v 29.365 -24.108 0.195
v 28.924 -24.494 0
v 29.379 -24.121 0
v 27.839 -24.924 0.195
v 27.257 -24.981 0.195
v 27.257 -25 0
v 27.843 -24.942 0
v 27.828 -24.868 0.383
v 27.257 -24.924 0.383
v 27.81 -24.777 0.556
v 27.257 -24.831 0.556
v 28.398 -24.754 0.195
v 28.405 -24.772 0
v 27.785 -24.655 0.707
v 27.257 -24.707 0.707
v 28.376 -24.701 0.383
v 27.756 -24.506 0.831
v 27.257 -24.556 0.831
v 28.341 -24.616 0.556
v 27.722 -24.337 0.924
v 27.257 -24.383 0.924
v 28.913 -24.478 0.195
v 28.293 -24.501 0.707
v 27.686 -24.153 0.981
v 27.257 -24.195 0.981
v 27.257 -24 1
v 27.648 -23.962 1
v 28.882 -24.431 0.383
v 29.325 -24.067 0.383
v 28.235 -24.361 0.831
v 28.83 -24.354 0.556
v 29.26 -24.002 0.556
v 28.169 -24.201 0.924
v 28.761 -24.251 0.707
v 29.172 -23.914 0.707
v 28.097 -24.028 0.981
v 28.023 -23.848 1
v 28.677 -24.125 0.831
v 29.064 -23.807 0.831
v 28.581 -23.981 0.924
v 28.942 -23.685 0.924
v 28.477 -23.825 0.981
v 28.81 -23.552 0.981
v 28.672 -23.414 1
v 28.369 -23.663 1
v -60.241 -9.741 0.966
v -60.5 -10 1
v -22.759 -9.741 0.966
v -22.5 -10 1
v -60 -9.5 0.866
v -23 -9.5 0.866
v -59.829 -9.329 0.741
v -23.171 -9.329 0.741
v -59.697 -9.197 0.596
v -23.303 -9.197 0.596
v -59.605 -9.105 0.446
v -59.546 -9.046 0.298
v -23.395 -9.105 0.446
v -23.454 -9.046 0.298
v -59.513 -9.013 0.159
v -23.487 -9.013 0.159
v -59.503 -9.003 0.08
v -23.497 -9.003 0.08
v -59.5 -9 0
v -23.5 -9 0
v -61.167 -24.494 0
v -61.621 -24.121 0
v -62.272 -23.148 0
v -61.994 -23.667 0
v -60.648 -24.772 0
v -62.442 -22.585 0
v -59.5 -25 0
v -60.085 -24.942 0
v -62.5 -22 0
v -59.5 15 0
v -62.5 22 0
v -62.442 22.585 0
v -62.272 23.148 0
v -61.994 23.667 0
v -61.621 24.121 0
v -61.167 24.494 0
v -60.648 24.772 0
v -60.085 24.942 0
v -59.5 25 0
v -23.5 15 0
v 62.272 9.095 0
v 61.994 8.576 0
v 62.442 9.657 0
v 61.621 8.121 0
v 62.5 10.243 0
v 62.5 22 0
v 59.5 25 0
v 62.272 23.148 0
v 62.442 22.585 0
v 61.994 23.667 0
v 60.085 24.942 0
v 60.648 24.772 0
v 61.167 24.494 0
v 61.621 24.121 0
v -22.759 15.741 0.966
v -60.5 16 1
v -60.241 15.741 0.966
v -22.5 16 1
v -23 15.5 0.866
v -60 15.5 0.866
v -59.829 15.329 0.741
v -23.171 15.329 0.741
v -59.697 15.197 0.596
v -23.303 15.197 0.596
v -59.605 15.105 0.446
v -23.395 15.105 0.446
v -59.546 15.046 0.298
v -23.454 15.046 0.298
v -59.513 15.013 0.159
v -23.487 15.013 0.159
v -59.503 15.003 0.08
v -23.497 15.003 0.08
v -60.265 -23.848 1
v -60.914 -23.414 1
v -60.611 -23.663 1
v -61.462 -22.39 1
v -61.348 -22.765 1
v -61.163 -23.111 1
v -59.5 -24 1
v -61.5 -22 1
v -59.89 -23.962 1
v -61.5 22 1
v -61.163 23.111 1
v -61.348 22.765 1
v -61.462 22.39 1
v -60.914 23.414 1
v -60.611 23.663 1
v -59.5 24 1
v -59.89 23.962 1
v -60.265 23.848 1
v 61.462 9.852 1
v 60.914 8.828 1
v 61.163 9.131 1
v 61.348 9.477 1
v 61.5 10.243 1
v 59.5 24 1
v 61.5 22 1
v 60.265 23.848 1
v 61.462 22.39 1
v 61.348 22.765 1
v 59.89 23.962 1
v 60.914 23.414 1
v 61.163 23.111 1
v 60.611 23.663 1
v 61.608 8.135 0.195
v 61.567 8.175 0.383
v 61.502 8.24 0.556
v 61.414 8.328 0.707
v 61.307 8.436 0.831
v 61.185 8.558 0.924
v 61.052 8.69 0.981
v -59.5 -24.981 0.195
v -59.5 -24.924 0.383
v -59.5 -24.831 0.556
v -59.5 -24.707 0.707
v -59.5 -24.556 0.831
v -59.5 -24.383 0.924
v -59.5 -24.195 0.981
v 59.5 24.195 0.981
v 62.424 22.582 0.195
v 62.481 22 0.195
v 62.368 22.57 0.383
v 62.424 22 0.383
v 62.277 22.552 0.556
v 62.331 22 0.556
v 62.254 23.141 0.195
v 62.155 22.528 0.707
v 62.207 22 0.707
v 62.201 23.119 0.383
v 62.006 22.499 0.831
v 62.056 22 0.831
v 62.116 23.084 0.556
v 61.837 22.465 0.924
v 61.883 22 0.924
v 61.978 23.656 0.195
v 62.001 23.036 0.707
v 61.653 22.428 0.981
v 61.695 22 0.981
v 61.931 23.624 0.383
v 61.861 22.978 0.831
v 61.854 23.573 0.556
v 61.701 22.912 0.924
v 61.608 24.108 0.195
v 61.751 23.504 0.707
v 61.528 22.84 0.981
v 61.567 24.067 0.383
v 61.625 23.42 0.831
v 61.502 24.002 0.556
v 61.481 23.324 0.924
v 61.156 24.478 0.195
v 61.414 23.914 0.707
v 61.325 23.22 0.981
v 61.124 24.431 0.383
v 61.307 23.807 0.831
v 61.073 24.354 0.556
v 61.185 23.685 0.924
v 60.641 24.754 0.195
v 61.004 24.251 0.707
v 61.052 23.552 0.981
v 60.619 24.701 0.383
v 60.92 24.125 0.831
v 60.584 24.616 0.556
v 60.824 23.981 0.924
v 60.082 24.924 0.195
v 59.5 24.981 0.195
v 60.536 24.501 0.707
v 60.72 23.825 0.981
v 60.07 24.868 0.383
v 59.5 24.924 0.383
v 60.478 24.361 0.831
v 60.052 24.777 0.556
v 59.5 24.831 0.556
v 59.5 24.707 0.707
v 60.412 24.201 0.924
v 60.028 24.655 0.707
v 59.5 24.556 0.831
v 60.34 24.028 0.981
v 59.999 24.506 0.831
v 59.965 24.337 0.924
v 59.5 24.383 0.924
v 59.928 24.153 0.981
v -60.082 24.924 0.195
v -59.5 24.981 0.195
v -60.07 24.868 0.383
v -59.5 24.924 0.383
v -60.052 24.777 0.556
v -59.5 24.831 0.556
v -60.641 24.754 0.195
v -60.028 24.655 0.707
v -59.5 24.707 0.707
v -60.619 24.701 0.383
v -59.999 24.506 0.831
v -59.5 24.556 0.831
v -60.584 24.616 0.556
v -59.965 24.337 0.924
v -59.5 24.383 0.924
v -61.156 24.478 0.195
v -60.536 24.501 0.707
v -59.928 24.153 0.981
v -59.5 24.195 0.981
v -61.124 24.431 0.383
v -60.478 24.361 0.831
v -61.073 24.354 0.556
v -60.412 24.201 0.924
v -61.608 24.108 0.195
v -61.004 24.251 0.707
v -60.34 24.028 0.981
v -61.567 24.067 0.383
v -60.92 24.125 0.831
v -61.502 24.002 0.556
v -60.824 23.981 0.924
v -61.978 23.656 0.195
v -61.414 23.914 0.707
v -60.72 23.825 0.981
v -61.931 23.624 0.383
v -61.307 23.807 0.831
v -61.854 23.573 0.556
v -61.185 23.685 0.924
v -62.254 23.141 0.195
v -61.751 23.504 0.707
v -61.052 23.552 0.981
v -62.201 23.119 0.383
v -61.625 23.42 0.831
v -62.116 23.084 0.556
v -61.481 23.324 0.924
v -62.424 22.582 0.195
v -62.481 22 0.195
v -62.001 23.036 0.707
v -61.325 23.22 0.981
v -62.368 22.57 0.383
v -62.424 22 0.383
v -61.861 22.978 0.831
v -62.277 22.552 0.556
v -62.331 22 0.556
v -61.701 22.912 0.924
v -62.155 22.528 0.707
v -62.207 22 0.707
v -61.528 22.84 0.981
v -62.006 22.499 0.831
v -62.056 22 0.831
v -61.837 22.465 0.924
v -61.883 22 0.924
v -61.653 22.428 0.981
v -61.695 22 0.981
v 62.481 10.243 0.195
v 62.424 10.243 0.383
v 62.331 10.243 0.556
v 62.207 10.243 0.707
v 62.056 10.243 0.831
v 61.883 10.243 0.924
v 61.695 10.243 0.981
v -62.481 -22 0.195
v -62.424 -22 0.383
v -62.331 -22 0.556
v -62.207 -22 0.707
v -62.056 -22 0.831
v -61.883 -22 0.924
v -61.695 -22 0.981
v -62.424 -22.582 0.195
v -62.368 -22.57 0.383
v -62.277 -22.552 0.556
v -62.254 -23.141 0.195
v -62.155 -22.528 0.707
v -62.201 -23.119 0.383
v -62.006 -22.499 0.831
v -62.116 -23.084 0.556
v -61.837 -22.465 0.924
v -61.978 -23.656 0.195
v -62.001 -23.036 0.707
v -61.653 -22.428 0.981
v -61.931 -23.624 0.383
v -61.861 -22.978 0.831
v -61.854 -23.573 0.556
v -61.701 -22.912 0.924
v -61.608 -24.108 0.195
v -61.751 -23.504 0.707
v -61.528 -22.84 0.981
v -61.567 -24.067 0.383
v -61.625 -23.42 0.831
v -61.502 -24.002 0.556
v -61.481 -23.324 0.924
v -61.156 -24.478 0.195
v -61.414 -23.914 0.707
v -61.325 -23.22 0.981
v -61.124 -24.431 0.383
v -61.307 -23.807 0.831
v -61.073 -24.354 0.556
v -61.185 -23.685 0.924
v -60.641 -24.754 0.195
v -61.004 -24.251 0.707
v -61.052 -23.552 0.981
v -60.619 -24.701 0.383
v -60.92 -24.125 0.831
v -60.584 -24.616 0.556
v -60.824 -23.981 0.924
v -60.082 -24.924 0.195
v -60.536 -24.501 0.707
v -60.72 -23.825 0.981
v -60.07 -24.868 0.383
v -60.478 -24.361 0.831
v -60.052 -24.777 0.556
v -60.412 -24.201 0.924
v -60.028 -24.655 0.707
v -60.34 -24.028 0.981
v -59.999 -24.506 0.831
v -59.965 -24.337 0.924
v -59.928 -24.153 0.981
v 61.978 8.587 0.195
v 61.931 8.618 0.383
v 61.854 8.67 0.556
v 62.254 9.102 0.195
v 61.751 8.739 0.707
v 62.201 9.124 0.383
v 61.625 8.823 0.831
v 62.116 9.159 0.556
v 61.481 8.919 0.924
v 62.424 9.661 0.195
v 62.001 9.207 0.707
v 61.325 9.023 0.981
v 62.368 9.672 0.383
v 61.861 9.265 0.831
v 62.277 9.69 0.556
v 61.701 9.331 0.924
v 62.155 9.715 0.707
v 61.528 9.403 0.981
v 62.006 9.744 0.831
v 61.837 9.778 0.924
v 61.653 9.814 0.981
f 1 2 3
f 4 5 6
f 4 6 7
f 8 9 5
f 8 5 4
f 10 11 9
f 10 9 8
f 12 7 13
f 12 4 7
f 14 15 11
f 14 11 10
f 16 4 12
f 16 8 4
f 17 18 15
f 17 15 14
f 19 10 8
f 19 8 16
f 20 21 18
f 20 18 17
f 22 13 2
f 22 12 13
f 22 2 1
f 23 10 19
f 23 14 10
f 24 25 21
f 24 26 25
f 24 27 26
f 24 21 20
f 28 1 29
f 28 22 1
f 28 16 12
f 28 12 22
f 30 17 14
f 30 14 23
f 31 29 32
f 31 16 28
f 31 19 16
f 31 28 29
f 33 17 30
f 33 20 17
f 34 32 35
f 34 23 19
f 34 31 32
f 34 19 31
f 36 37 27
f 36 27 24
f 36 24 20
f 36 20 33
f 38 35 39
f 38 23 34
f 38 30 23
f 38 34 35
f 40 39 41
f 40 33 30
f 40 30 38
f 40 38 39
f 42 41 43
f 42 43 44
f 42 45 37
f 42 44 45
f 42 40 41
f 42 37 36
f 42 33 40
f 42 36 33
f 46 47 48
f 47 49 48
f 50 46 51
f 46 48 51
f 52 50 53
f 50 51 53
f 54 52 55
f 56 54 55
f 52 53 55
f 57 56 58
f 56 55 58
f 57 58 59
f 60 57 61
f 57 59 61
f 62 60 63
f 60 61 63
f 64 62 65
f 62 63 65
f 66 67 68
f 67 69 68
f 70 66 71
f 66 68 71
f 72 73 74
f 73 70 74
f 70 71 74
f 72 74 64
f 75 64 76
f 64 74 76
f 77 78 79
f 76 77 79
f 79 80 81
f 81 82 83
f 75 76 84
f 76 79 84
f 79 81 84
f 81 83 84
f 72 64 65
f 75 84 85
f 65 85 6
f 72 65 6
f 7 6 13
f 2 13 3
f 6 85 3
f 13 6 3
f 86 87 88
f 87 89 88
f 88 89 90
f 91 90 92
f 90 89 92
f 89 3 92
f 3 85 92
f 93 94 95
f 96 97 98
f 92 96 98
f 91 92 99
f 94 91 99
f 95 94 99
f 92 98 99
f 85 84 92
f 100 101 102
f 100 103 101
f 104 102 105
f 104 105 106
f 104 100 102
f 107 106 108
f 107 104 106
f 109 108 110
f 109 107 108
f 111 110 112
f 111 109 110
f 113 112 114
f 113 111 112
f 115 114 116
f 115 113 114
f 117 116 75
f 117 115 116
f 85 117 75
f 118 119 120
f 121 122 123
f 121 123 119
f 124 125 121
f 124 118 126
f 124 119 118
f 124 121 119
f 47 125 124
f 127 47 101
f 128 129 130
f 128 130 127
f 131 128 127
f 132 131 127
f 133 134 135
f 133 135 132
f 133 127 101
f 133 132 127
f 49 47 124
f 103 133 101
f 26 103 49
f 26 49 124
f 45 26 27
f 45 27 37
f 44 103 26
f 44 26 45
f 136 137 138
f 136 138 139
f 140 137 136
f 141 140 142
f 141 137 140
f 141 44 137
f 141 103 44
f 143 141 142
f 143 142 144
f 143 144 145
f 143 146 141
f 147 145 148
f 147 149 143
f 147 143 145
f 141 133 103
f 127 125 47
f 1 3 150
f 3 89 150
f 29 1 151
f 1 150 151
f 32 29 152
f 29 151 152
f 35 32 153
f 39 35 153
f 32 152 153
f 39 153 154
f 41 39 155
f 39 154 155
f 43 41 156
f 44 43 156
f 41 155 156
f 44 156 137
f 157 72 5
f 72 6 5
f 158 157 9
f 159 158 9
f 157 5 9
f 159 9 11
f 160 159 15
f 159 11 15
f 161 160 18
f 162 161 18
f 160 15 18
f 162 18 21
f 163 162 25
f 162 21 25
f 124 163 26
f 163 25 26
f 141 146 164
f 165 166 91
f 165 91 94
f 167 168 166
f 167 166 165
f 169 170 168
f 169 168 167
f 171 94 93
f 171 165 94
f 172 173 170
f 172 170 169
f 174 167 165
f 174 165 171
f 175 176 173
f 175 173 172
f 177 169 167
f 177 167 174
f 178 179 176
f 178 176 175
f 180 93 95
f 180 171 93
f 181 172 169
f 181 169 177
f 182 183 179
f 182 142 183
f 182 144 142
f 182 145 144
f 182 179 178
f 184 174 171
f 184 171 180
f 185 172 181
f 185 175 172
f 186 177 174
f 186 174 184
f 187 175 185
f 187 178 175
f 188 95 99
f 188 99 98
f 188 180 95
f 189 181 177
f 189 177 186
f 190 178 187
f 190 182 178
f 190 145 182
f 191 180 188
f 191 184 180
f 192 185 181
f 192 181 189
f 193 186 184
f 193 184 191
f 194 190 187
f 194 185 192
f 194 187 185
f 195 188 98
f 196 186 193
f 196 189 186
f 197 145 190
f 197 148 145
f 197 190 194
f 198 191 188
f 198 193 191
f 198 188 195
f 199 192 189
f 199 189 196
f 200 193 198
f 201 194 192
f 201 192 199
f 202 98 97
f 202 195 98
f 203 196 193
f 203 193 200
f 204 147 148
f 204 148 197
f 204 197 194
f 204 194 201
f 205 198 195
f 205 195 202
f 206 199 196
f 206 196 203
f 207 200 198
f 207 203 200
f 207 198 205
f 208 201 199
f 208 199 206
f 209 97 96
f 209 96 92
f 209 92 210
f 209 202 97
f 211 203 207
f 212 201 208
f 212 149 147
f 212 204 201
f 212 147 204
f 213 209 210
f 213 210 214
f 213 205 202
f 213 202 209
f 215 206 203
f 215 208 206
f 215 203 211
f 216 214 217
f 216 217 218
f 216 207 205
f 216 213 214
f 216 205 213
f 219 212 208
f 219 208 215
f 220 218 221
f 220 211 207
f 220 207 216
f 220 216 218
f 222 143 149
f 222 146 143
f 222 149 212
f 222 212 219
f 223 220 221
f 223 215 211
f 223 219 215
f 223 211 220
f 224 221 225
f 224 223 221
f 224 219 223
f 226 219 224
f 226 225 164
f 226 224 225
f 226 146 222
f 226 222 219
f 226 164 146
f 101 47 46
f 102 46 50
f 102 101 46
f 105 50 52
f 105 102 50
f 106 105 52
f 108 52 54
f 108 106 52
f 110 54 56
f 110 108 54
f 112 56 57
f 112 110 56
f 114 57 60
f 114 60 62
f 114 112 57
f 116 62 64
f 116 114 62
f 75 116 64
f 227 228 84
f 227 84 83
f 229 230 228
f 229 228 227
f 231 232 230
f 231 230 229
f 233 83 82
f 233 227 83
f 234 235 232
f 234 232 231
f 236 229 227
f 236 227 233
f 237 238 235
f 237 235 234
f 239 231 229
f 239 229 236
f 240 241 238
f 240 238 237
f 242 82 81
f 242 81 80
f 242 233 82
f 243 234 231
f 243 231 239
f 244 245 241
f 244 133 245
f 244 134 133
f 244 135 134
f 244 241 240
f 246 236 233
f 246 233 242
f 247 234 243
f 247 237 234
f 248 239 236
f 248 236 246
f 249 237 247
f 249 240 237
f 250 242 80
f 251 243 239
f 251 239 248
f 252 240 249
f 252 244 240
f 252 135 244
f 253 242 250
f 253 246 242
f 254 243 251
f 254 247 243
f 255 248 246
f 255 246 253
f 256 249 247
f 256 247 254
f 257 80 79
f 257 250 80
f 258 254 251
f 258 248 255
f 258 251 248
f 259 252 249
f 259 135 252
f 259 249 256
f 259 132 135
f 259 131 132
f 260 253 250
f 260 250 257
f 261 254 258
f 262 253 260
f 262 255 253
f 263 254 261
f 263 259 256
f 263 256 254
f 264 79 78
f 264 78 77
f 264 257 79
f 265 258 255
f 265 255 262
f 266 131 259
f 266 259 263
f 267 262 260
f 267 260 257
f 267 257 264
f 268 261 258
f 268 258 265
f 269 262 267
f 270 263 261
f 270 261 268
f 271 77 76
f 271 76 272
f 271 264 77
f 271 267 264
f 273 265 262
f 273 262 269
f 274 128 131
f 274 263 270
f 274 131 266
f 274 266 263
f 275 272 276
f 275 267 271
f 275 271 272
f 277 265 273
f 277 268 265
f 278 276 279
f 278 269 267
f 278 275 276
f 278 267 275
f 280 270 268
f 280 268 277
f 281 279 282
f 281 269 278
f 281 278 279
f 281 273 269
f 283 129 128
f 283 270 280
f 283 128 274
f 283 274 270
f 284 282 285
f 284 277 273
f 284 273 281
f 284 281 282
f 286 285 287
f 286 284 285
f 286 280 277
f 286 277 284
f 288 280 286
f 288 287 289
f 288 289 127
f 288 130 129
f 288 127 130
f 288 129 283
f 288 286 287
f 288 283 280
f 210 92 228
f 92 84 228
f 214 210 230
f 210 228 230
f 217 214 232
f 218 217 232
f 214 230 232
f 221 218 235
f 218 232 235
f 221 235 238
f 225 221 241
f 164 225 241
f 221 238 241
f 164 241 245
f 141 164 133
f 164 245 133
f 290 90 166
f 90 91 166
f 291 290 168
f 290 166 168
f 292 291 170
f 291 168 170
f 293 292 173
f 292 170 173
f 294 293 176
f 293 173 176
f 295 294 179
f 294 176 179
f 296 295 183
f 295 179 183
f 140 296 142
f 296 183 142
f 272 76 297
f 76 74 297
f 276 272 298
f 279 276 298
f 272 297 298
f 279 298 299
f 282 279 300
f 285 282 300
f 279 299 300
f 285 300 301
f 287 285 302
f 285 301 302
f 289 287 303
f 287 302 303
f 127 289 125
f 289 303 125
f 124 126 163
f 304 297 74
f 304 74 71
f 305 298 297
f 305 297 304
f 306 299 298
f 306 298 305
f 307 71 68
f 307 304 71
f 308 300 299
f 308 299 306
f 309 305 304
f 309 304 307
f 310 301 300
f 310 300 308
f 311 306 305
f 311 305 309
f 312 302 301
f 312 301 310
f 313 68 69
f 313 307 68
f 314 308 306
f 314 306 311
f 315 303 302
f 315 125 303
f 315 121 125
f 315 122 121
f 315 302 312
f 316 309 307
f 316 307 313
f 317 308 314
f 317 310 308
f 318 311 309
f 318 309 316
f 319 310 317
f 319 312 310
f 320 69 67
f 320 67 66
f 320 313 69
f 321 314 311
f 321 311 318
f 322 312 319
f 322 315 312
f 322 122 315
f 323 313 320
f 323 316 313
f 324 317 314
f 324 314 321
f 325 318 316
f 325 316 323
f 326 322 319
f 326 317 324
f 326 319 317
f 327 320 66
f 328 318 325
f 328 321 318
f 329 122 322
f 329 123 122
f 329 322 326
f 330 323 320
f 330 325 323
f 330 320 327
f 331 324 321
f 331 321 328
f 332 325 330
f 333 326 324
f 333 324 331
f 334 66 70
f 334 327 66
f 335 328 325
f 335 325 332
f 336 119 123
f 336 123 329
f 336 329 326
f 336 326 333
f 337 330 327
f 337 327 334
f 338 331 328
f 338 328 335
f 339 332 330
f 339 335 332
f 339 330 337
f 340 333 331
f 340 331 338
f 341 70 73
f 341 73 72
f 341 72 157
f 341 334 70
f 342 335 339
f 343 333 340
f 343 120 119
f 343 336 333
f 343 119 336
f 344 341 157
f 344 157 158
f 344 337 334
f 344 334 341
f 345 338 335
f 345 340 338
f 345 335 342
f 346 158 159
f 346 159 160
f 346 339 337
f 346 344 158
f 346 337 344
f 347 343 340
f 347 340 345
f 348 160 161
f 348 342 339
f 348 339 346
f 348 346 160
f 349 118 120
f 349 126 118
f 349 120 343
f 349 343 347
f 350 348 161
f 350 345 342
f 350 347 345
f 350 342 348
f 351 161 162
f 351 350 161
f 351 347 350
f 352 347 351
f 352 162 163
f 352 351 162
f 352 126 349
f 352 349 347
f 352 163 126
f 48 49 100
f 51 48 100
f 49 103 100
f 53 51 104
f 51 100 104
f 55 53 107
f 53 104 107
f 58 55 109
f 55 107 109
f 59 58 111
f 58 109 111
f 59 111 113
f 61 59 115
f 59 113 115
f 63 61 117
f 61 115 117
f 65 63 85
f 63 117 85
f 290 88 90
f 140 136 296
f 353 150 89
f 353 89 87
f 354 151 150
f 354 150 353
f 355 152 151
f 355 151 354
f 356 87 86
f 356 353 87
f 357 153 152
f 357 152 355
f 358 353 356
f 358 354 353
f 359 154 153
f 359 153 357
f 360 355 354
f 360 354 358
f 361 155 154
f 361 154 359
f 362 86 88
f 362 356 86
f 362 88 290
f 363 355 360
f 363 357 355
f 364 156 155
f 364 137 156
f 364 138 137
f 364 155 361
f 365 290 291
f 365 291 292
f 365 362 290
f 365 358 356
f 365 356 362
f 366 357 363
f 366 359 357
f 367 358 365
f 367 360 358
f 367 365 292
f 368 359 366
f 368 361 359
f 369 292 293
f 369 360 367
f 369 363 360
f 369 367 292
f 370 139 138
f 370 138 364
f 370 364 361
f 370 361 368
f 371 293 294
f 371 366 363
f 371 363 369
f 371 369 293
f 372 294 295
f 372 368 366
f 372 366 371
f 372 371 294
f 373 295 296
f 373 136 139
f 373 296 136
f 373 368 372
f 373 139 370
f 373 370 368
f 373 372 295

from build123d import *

# Parameters (mm, degrees)
F1_DEPTH = 1
F2_W     = 36
F2_H     = 24
F3_DEPTH = 25
F4_R     = 3
F5_R     = 0.99999


# Not quite as in the source:
# - a fillet or chamfer is up to 0.001 mm smaller than in the source, because OpenCascade refuses the exact size


with BuildPart() as f1:
    # F0 (on Top) → F1 (new body)
    with BuildSketch(Plane.XY):
        Polygon((62.5, 9), (62.5, 25), (-62.5, 25), (-62.5, -25), (28.5, -25), align=None)
    extrude(amount=F1_DEPTH)

    # F2 (on face) → F3 (cut)
    with BuildSketch(Plane.XY.offset(1)):
        with Locations((-41.5, 3)):
            Rectangle(F2_W, F2_H)
    extrude(amount=-F3_DEPTH, mode=Mode.SUBTRACT)

    # F4
    f4_edges = [f1.edges().sort_by_distance(p)[0] for p in [
        (-62.5, 25, 0.5),
        (-62.5, -25, 0.5),
        (62.5, 25, 0.5),
        (28.5, -25, 0.5),
        (62.5, 9, 0.5),
    ]]
    fillet(f4_edges, radius=F4_R)

    # F5 (radius 1 in the source; OpenCascade refuses exactly that, so slightly less here)
    f5_edges = [f1.edges().sort_by_distance(p)[0] for p in [
        (62.5, 16.12132, 1),
        (62.271639, 9.09459, 1),
        (61.62132, 24.12132, 1),
        (45.5, -8, 1),
        (0, 25, 1),
        (28.40541, -24.771639, 1),
        (-61.62132, 24.12132, 1),
        (-16.12132, -25, 1),
        (-62.5, 0, 1),
        (-61.62132, -24.12132, 1),
        (-23.5, 3, 1),
        (-41.5, 15, 1),
        (-59.5, 3, 1),
        (-41.5, -9, 1),
    ]]
    fillet(f5_edges, radius=F5_R)


solid = f1.part
